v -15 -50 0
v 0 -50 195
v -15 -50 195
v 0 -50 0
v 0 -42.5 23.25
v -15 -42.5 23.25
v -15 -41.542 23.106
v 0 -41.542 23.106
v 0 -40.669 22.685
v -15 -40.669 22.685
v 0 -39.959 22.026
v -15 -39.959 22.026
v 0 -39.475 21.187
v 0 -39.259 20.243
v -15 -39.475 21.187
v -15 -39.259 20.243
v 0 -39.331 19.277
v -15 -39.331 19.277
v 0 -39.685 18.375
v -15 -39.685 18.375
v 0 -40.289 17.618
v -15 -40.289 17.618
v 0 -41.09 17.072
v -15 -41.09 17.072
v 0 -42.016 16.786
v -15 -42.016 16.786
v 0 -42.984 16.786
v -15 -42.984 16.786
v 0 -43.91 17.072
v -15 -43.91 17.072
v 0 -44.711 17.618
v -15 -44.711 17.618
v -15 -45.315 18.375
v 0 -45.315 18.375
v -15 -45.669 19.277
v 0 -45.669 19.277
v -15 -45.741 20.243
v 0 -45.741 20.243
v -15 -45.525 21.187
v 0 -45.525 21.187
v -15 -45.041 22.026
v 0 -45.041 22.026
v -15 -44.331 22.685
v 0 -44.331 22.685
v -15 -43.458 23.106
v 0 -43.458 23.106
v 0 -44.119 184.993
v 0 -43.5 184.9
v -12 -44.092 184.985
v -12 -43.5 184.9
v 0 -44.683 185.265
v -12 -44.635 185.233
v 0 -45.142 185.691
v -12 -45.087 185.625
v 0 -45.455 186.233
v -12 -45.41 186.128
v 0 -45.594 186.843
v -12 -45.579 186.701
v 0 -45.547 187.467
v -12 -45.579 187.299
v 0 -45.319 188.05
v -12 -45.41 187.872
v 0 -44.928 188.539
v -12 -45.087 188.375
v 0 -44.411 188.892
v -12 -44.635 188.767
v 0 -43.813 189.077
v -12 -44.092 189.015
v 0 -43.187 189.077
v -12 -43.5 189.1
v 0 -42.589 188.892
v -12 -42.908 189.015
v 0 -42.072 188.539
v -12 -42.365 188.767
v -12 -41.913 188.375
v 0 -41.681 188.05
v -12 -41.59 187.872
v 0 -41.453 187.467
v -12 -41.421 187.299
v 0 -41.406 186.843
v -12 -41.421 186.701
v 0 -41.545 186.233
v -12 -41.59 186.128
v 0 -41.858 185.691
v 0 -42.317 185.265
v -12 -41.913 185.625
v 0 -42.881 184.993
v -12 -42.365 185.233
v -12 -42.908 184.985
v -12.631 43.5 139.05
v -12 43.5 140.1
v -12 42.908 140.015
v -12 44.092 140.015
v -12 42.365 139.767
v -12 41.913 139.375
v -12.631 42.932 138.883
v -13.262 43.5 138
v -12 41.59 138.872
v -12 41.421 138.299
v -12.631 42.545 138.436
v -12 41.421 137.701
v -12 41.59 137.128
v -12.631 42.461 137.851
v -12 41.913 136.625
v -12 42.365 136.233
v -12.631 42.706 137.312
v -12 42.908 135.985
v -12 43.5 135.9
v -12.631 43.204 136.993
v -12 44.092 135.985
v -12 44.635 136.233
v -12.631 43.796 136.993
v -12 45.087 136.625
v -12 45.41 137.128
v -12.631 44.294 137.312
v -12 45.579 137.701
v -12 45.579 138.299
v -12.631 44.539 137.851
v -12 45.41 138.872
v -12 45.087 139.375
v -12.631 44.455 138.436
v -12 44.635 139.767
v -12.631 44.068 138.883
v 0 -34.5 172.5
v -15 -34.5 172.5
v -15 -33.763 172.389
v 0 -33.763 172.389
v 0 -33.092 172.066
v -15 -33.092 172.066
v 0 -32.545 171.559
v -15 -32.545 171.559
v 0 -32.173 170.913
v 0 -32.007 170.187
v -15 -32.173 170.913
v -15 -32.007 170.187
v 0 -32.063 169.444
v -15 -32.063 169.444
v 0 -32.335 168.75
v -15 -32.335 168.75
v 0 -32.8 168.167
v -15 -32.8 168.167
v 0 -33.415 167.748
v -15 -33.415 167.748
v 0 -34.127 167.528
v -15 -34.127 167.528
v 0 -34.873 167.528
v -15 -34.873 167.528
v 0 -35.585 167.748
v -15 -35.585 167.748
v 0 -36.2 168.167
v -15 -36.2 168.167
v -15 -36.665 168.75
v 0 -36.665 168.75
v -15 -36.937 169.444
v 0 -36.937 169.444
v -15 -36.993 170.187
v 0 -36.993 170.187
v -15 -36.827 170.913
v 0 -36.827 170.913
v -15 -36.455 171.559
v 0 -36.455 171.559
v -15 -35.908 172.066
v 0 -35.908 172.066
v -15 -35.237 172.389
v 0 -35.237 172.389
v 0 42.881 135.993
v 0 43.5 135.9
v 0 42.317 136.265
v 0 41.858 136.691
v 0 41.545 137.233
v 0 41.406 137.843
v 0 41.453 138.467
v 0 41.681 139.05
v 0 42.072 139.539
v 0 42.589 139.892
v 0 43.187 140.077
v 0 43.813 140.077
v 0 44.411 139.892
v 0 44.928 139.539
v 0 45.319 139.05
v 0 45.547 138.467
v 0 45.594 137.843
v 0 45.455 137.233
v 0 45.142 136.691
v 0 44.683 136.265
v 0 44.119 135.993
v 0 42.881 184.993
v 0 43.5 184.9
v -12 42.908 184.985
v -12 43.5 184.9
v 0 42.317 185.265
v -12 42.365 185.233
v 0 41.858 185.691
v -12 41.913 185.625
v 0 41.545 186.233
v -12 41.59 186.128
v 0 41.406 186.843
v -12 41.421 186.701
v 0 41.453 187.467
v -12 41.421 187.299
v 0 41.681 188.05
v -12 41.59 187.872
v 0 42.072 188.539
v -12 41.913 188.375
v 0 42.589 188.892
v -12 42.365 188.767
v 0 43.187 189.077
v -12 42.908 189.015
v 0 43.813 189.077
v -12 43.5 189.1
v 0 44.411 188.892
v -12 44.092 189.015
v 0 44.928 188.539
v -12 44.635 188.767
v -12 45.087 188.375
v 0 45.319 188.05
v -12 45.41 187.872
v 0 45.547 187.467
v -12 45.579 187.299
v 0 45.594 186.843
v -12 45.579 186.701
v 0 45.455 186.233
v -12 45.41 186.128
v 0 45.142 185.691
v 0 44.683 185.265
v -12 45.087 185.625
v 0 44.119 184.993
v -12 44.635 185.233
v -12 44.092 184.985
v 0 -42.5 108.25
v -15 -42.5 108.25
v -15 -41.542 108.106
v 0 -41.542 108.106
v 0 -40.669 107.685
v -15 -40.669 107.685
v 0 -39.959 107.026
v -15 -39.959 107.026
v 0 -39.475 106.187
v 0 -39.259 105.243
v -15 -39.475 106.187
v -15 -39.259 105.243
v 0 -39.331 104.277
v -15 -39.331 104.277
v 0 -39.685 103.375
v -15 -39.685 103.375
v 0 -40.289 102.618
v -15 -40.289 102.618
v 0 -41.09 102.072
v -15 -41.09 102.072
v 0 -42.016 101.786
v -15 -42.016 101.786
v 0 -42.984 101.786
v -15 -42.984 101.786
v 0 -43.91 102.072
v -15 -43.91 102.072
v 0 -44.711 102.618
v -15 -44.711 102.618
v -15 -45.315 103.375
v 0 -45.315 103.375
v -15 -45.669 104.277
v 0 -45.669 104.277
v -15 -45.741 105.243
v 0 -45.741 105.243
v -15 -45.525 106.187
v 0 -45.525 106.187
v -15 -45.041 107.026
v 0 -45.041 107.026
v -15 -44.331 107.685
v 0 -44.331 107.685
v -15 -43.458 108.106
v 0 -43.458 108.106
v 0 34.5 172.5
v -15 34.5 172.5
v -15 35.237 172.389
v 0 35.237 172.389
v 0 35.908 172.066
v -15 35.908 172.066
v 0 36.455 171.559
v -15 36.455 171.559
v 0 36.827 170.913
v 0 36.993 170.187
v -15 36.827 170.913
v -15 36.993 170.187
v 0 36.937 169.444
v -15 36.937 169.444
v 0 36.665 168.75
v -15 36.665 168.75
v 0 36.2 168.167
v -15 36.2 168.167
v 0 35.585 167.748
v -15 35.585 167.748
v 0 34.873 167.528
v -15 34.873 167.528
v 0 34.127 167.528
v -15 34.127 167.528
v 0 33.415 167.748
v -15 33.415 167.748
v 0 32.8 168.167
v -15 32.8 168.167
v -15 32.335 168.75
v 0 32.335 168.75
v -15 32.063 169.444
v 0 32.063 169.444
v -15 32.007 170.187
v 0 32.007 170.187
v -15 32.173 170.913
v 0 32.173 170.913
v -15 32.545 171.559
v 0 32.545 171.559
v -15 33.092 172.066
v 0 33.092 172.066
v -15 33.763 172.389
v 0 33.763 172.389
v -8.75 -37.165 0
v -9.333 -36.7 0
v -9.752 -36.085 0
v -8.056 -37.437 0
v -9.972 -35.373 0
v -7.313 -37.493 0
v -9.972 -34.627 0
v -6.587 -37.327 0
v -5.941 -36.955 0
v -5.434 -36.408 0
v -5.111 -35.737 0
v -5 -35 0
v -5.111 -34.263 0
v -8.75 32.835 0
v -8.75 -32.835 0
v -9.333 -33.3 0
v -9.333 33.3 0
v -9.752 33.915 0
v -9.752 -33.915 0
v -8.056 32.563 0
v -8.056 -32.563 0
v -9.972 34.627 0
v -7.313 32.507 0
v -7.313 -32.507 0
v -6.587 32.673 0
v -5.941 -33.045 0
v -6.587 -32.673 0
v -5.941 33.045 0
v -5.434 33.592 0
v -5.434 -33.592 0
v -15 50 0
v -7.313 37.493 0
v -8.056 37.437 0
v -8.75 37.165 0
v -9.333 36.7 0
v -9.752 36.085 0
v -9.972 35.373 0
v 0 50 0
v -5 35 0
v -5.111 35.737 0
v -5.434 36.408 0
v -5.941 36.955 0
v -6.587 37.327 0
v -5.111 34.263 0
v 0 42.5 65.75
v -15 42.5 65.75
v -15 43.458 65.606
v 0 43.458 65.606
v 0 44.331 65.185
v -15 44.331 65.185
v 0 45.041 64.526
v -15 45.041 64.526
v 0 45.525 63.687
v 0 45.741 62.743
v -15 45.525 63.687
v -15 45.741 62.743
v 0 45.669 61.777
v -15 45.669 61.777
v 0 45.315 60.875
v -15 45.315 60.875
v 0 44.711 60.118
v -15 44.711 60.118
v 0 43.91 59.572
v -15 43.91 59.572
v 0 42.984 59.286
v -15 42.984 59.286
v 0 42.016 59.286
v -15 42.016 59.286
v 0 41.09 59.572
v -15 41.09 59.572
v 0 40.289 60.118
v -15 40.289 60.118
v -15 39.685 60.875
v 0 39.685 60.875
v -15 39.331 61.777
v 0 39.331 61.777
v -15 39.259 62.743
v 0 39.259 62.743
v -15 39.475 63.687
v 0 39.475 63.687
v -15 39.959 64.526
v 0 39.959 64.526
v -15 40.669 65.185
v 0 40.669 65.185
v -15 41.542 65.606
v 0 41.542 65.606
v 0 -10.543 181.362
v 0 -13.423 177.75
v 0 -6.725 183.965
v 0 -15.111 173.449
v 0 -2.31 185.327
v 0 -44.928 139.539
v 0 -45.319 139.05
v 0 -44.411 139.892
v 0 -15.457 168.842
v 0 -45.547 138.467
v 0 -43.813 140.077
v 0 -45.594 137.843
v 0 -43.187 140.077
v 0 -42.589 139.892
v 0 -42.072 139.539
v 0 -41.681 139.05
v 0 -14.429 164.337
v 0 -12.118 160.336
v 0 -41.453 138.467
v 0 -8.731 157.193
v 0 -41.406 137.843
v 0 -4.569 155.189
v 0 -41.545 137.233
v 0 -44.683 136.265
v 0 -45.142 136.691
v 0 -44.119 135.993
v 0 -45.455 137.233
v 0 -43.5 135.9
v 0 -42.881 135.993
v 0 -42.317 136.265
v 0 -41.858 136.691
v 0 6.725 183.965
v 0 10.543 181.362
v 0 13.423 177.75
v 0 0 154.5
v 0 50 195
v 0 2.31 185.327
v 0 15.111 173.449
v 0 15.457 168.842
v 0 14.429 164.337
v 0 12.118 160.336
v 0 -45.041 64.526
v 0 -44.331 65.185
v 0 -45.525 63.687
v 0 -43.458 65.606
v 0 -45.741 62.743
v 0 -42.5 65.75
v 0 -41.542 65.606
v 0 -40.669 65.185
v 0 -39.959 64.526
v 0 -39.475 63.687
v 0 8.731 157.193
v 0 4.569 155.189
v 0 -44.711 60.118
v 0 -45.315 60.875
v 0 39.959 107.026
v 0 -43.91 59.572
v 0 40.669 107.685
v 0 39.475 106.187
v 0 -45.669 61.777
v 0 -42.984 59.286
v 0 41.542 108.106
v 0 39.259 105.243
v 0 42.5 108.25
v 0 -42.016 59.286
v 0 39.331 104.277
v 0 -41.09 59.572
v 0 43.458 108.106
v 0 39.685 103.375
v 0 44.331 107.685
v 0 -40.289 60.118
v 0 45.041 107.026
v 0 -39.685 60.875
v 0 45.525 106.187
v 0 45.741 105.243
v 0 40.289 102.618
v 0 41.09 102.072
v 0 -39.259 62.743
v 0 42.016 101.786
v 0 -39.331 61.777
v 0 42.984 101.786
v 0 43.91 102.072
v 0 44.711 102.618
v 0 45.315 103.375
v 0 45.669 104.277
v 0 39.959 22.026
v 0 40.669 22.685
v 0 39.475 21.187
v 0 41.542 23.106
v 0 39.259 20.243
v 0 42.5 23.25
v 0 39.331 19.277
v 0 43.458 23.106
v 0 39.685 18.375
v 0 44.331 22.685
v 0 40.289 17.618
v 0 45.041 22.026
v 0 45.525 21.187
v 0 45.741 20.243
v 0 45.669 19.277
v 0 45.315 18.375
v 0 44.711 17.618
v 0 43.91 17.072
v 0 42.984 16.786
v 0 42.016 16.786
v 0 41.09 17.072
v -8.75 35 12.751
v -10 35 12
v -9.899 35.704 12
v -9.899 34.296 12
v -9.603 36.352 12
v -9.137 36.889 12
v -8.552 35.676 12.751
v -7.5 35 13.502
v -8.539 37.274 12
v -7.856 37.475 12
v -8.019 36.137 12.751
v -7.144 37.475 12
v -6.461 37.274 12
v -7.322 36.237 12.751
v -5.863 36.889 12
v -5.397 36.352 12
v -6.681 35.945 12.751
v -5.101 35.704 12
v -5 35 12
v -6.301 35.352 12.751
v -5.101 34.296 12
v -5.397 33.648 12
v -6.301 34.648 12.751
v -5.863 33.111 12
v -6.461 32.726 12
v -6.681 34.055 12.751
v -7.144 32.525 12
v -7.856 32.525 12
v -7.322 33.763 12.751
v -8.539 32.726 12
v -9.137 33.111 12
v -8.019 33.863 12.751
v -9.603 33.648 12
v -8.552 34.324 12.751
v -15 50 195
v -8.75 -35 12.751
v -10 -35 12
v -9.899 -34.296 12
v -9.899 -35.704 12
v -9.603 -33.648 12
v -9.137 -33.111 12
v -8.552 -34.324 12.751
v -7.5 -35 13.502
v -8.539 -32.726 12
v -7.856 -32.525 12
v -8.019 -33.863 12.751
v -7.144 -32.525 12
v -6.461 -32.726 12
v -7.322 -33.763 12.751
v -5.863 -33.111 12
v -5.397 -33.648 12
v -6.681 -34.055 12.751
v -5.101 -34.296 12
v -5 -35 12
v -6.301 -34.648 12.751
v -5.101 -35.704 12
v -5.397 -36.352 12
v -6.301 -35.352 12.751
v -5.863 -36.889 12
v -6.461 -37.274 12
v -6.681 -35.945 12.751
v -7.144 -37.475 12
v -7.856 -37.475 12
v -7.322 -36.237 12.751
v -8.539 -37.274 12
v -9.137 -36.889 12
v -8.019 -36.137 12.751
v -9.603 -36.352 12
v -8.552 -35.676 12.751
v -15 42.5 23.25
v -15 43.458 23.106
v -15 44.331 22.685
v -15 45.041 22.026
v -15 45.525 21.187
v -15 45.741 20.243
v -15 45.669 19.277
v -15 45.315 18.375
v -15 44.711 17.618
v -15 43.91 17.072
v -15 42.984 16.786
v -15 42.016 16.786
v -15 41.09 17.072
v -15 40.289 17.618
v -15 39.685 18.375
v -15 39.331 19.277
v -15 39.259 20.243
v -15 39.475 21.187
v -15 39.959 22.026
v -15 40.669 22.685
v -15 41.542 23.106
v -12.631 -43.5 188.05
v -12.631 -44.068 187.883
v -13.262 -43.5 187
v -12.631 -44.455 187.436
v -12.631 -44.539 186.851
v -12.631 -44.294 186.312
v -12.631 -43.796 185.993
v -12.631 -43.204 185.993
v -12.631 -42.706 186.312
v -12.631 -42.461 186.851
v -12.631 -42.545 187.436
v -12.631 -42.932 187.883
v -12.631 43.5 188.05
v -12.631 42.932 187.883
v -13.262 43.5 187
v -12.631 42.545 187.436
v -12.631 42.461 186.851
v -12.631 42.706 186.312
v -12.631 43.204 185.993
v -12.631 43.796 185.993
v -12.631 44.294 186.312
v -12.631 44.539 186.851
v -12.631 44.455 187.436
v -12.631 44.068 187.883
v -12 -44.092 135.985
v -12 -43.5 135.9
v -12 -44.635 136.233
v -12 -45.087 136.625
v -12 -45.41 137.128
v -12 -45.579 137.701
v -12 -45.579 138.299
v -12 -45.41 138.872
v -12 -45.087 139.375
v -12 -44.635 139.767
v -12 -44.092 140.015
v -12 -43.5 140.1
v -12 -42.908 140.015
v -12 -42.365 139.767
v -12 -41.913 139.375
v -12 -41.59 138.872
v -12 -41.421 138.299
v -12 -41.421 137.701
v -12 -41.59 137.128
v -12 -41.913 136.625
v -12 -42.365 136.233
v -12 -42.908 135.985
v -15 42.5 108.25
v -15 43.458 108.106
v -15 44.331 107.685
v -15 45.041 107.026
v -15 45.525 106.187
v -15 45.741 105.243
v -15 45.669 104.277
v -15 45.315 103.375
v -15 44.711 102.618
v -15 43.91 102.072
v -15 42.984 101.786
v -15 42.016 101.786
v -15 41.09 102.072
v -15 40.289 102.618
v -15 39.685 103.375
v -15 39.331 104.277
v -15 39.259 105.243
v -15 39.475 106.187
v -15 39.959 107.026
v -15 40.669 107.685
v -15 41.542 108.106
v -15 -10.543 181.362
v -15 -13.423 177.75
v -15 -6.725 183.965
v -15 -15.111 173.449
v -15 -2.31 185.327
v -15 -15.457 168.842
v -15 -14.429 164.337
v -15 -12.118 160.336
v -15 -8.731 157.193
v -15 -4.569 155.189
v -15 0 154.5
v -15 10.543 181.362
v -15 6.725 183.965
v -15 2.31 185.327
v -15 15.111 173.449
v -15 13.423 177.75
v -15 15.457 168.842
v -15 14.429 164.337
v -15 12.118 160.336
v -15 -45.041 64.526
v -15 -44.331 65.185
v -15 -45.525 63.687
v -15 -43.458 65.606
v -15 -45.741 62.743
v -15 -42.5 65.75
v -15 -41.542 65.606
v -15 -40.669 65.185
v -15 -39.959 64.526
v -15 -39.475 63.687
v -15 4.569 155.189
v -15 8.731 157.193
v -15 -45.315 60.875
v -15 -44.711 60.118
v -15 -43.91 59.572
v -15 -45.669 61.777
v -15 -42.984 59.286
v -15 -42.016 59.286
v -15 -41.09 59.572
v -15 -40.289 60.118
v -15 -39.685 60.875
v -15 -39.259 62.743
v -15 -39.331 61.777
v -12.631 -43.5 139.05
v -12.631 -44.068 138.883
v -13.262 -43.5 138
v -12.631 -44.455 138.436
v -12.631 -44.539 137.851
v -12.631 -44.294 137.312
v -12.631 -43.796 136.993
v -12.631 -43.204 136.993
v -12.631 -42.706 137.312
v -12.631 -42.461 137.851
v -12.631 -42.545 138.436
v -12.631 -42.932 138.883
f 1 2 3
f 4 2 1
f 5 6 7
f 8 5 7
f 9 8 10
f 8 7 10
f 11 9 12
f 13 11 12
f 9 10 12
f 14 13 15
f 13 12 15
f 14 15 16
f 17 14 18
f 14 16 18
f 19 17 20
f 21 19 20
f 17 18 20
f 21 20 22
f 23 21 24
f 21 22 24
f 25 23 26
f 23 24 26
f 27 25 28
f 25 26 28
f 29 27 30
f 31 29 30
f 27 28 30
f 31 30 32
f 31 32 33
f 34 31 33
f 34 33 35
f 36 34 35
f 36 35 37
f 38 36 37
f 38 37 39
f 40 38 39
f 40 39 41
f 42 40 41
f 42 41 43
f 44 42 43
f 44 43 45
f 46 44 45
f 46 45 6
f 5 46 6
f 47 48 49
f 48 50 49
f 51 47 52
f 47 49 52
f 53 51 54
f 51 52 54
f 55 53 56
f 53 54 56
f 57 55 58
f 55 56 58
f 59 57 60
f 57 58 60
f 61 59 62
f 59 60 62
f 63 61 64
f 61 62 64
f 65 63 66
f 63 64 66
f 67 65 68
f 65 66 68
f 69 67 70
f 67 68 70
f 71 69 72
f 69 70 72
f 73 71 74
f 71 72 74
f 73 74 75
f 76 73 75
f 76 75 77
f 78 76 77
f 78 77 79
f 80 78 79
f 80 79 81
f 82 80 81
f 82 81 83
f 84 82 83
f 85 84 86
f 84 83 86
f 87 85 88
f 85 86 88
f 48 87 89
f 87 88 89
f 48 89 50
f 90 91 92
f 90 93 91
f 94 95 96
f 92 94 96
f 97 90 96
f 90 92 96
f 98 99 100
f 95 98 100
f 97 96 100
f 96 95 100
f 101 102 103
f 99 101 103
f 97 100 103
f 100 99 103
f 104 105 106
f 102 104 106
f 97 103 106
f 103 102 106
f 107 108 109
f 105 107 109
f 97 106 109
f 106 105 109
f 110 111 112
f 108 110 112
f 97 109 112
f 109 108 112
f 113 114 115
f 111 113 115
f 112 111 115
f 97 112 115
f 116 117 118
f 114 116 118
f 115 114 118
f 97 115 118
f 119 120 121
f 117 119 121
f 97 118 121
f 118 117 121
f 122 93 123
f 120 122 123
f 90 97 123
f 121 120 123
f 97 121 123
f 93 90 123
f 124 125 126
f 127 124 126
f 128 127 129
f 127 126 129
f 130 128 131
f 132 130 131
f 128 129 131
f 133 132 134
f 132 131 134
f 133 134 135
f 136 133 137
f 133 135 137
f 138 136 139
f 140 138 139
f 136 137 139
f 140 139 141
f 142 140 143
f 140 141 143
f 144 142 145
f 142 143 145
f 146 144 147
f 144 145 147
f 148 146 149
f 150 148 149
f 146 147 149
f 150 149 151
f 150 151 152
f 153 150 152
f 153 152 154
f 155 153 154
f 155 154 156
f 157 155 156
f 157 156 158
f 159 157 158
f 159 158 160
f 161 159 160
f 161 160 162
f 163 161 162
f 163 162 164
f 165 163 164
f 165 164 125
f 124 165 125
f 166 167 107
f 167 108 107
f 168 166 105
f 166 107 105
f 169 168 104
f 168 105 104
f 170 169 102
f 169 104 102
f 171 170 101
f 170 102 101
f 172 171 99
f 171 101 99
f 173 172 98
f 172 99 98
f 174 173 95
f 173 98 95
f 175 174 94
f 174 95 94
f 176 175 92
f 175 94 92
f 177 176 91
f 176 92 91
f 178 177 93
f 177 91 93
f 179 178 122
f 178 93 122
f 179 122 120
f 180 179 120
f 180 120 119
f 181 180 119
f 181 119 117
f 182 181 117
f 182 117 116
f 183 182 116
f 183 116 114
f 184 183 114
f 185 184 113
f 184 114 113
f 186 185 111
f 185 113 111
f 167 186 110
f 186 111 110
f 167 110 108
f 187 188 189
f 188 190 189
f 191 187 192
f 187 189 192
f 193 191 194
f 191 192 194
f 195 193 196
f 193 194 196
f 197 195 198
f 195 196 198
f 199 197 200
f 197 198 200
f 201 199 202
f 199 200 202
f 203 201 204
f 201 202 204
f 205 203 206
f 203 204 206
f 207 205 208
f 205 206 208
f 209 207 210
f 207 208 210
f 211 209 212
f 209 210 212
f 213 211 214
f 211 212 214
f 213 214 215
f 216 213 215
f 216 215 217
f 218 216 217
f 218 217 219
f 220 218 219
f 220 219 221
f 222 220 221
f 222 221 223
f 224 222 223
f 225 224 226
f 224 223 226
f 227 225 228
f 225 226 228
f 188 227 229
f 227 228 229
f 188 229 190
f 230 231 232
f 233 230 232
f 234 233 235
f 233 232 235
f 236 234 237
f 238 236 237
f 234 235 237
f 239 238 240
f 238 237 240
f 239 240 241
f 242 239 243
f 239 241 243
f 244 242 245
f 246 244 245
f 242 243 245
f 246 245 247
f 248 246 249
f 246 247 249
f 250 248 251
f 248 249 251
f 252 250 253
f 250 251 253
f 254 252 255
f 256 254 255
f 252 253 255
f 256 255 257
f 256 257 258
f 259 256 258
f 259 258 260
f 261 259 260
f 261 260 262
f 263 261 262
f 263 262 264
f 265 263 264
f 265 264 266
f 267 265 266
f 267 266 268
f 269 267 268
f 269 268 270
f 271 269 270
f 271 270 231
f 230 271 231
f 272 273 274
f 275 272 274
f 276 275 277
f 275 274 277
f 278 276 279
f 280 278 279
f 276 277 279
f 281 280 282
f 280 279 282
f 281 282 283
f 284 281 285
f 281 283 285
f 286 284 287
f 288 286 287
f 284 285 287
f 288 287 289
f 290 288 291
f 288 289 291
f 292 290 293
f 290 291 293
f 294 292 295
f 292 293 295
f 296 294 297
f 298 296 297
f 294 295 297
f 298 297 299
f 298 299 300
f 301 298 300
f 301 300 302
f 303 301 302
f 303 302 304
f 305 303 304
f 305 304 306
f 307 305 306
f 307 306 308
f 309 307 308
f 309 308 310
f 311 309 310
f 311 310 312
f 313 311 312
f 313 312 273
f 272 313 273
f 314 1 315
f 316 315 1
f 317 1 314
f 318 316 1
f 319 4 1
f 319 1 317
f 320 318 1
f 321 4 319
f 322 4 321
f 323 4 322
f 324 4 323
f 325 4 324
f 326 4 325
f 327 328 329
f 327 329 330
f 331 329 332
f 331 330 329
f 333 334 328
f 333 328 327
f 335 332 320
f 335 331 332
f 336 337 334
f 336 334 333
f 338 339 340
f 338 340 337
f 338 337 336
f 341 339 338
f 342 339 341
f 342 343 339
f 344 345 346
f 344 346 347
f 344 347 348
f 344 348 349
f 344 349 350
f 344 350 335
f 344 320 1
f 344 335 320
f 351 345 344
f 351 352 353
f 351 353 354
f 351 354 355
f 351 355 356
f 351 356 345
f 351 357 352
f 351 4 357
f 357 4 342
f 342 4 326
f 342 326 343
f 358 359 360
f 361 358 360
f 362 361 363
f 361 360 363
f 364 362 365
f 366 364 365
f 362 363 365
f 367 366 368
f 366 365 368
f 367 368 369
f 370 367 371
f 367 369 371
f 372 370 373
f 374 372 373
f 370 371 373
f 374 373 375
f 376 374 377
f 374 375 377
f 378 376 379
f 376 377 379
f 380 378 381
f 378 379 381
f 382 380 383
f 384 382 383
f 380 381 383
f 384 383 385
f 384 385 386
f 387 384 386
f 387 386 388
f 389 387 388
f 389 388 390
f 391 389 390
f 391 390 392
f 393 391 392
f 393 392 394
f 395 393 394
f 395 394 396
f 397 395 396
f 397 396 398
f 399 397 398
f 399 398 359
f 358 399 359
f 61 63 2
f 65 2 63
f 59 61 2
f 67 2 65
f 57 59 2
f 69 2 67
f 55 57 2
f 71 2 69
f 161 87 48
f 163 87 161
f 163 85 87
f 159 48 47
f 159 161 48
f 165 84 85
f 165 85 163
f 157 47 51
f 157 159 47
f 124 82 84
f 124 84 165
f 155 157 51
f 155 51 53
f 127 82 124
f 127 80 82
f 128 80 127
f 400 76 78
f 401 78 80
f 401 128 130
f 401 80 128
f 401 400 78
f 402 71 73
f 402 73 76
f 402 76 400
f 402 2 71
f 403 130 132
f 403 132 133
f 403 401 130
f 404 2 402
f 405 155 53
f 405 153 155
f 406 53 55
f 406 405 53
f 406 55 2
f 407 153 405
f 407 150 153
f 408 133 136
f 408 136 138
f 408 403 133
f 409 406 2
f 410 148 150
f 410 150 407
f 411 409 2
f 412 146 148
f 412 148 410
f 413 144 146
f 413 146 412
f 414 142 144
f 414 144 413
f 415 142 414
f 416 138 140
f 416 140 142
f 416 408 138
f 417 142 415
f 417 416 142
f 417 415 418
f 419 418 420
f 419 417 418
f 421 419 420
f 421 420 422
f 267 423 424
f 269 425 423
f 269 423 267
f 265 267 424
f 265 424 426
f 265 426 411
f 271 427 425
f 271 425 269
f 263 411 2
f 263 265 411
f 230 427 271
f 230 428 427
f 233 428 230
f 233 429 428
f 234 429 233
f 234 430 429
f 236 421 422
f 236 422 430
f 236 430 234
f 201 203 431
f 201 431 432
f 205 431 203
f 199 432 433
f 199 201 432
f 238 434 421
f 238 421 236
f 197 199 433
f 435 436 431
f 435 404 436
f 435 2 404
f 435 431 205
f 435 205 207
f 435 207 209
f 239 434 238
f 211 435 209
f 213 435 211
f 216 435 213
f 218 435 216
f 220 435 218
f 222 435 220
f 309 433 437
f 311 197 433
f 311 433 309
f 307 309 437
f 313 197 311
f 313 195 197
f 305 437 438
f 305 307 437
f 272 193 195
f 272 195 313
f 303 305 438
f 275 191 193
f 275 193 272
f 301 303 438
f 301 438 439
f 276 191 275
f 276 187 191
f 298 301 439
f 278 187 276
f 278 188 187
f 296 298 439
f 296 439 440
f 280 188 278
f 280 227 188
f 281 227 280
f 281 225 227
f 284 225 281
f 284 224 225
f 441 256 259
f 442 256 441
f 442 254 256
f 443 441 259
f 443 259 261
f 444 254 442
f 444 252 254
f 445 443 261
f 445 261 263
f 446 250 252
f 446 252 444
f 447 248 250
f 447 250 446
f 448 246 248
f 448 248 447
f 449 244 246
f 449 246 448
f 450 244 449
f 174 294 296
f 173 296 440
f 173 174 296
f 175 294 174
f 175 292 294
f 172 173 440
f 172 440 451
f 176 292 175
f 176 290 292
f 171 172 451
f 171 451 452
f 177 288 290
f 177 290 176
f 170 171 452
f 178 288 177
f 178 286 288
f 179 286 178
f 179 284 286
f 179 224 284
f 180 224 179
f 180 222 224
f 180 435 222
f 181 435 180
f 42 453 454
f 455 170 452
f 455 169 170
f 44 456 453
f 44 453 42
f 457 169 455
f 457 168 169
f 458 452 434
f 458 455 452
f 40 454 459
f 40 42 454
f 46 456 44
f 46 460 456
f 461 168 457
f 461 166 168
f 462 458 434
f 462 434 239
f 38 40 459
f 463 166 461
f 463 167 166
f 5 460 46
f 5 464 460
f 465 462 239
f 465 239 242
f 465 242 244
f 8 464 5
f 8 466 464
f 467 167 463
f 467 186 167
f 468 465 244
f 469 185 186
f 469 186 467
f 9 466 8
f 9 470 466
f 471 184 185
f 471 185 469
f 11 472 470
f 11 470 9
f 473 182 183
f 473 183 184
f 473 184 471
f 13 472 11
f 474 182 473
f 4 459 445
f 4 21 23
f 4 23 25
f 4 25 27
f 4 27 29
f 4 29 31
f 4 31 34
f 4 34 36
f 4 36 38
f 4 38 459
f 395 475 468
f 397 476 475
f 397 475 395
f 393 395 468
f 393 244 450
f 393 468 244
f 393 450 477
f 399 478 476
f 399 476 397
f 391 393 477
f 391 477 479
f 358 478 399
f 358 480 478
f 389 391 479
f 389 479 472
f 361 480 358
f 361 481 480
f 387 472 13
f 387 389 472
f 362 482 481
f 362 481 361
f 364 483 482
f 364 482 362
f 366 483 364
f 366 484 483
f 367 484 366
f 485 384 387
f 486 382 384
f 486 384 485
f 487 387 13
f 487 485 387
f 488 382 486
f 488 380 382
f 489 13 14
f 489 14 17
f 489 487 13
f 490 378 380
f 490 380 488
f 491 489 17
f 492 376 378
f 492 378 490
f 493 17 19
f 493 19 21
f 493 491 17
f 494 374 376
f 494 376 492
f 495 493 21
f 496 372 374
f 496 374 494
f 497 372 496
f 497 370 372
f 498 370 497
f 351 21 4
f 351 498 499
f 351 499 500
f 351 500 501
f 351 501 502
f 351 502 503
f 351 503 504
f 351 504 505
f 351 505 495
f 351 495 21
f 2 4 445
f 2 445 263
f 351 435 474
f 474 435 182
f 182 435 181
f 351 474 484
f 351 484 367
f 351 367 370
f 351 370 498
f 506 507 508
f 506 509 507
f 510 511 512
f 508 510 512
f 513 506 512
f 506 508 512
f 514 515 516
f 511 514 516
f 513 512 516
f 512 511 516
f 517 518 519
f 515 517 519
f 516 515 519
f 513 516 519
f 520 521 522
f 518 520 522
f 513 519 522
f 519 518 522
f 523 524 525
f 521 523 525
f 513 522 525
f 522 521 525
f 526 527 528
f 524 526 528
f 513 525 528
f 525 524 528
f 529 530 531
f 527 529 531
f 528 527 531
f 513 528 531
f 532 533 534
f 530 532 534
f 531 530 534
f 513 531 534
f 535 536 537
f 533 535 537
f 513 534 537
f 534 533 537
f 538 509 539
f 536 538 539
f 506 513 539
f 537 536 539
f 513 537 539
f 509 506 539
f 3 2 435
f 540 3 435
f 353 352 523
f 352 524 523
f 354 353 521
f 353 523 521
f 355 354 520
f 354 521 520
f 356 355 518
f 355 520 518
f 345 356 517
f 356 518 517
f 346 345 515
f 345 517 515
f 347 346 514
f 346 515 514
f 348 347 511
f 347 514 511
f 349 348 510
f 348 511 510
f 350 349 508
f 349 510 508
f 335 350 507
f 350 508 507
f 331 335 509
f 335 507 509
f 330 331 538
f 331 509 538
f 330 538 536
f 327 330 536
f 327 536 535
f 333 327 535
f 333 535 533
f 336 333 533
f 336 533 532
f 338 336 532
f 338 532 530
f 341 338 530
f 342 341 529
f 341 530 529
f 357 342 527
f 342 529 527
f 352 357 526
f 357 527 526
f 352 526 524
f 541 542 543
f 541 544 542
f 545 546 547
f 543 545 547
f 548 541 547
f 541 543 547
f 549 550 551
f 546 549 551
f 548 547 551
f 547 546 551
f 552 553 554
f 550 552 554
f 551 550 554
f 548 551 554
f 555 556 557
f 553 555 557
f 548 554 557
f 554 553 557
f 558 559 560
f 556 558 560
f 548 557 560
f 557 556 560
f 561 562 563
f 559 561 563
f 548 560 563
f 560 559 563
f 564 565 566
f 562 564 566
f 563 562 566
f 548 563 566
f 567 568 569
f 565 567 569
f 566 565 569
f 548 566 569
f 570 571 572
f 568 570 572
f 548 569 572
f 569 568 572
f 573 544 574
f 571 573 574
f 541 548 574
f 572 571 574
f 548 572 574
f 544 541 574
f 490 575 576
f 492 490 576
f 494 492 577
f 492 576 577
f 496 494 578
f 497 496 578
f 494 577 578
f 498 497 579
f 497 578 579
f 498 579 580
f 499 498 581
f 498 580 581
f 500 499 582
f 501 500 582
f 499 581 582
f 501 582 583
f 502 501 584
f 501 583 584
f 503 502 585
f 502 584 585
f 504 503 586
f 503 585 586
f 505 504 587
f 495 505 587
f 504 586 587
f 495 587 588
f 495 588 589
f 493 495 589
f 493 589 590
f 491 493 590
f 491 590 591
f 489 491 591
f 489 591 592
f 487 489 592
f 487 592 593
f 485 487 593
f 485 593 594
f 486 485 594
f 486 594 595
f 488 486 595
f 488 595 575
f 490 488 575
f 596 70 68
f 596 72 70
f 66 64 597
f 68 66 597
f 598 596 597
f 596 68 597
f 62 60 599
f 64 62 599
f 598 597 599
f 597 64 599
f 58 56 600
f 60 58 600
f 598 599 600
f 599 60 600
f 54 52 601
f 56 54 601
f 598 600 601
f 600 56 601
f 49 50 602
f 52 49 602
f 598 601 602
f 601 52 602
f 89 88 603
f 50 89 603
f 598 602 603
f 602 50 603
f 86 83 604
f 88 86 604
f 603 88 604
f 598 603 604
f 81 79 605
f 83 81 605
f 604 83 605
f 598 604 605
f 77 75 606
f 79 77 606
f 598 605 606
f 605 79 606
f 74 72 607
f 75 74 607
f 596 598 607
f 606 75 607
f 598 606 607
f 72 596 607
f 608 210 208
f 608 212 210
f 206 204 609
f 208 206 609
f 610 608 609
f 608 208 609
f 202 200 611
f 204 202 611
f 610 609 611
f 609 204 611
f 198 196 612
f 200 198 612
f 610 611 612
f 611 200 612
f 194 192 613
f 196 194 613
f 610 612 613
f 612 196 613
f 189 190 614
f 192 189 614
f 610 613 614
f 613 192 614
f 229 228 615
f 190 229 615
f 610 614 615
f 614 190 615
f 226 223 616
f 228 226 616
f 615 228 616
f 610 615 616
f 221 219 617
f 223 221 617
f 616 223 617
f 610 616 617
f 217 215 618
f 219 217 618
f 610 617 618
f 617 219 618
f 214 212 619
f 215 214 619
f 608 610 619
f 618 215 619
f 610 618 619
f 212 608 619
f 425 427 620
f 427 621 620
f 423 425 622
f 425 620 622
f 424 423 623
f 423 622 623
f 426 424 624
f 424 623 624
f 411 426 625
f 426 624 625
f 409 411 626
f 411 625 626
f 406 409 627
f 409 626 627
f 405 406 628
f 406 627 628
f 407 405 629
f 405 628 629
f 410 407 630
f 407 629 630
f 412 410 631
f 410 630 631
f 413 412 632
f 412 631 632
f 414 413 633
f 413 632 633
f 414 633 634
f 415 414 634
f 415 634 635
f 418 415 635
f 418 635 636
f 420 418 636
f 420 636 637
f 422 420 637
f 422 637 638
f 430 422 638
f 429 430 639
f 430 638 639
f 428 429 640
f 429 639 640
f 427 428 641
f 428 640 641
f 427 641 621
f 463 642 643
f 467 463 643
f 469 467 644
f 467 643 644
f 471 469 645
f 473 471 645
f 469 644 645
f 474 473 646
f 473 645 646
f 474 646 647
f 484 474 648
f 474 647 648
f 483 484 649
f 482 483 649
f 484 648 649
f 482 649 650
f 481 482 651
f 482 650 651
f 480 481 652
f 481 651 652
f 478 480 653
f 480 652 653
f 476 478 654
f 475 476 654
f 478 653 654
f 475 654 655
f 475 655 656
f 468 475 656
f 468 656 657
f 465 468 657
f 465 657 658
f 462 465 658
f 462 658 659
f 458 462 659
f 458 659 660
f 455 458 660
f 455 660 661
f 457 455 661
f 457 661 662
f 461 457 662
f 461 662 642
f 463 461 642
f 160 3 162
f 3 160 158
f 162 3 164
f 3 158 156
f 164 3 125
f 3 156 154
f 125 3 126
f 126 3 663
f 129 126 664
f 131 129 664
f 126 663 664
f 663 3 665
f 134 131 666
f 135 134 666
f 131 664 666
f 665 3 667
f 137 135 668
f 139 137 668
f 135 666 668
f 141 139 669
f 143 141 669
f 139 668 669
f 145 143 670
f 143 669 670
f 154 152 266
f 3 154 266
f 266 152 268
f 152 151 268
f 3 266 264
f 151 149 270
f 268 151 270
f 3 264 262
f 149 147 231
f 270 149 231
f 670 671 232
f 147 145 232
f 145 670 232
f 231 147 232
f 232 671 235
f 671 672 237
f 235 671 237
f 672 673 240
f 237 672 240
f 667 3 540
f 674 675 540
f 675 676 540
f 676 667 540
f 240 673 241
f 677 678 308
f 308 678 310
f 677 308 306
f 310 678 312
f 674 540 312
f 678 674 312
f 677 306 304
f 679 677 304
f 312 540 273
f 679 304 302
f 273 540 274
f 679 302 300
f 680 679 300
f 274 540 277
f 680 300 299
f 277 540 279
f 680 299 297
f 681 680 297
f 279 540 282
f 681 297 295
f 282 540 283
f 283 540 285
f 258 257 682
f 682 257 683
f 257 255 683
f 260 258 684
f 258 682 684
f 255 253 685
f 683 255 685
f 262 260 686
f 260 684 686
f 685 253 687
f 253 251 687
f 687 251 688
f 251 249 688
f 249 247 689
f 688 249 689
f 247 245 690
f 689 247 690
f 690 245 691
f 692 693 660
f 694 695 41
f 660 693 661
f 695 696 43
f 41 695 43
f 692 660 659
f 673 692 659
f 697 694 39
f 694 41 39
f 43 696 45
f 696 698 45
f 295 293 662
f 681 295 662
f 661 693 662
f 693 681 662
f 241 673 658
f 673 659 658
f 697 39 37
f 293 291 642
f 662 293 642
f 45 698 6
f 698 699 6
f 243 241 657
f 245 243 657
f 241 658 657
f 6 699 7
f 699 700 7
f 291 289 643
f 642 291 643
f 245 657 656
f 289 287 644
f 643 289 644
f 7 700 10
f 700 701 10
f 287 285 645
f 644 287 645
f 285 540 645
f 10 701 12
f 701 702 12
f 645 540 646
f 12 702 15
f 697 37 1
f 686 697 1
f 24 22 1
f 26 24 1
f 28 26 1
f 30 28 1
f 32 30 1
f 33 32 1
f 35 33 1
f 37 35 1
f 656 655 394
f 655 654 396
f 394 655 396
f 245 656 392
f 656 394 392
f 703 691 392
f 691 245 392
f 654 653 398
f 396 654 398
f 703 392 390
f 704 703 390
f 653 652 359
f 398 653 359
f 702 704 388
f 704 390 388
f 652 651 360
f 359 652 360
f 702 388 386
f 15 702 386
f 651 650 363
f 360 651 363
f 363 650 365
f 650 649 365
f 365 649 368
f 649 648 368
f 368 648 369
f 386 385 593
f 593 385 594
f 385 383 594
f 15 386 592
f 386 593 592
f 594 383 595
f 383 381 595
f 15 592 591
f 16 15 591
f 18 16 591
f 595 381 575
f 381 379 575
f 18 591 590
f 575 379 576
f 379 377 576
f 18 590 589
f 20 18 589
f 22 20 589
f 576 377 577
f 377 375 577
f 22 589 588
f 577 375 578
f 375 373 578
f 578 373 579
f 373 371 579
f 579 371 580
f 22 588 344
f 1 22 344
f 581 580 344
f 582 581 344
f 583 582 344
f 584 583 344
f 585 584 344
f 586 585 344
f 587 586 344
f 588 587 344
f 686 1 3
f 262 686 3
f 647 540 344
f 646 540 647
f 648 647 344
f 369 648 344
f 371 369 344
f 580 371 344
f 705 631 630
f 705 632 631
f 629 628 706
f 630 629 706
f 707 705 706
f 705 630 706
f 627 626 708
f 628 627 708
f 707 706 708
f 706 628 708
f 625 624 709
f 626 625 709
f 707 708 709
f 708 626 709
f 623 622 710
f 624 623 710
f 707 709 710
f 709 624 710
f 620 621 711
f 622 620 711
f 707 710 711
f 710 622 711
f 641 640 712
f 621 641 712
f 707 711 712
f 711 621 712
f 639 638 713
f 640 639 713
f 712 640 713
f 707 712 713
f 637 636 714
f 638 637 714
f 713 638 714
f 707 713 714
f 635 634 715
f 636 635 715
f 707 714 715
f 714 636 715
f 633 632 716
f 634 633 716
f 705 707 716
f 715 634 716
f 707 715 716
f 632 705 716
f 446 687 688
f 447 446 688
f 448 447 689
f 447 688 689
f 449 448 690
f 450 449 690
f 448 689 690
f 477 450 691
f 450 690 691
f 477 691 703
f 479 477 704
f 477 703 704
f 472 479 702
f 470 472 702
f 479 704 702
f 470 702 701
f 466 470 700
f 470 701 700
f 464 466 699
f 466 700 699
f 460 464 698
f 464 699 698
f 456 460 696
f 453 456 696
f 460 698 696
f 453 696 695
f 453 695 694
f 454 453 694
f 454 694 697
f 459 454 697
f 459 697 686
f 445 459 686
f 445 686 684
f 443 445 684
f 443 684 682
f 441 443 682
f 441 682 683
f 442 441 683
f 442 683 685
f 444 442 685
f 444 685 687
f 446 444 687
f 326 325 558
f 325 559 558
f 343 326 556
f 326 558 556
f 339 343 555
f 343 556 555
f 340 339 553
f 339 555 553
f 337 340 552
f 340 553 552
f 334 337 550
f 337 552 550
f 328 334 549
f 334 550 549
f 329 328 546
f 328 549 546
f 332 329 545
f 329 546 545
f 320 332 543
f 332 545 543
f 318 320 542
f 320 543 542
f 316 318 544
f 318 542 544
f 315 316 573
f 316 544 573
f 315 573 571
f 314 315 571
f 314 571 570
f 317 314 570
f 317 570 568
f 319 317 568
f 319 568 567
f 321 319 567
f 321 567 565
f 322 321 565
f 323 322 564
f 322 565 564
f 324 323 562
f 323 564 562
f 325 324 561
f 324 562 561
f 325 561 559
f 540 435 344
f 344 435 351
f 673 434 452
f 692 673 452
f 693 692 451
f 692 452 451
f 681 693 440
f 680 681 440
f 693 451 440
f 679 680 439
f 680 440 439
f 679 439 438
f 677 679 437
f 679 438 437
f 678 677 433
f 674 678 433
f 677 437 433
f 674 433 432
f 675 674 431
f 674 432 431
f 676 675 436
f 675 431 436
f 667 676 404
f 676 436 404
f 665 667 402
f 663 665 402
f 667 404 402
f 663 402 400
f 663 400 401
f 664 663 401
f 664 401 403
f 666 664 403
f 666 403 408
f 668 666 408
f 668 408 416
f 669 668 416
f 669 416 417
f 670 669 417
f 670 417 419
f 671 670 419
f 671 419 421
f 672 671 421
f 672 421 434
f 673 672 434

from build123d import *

# Parameters (mm, degrees)
SKETCH11_W                 = 195
SKETCH11_H                 = 100
BOSS_EXTRUDE2_DEPTH        = 15
SKETCH2_R                  = 15.5
CUT_EXTRUDE1_DEPTH         = 202.866292382
M6_TAPPED_HOLE1_D          = 5
M6_TAPPED_HOLE1_DEPTH      = 12
M6_TAPPED_HOLE1_TIP        = 1.502151548
F_6_5_6_5_DIAMETER_HOLE1_D = 6.5
M5_TAPPED_HOLE1_D          = 4.2
M5_TAPPED_HOLE1_DEPTH      = 12
M5_TAPPED_HOLE1_TIP        = 1.2618073
M6_TAPPED_HOLE2_D          = 5


with BuildPart() as part:
    # Sketch11 → Boss-Extrude2 (new body)
    with BuildSketch(Plane(origin=(0, 0, 0), x_dir=(0, 0, -1), z_dir=(1, 0, 0))):
        with Locations((-97.5, 0)):
            Rectangle(SKETCH11_W, SKETCH11_H)
    extrude(amount=-BOSS_EXTRUDE2_DEPTH)

    # Sketch2 → Cut-Extrude1 (cut, through all)
    with BuildSketch(Plane(origin=(0, 0, 0), x_dir=(0, 0, -1), z_dir=(1, 0, 0))):
        with Locations((-170, 0)):
            Circle(SKETCH2_R)
    extrude(amount=-CUT_EXTRUDE1_DEPTH, mode=Mode.SUBTRACT)

    # M6 Tapped Hole1
    with Locations(Plane(origin=(-11.981616001, -34.658638116, 0), x_dir=(-1, 0, 0), z_dir=(0, 0, -1))):
        with Locations((-4.481616001, -0.341361884), (-4.481616001, 69.658638116)):
            Hole(M6_TAPPED_HOLE1_D / 2, depth=M6_TAPPED_HOLE1_DEPTH)
            with Locations((0, 0, -(M6_TAPPED_HOLE1_DEPTH + M6_TAPPED_HOLE1_TIP / 2))):  # 118° drill point
                Cone(0, M6_TAPPED_HOLE1_D / 2, M6_TAPPED_HOLE1_TIP, mode=Mode.SUBTRACT)

    # Ø6.5 (6.5) Diameter Hole1 (through all)
    with Locations(Plane(origin=(0, -7.362824857, 24.874407607), x_dir=(0, 0, -1), z_dir=(1, 0, 0))):
        with Locations((-80.125592393, -35.137175143), (-37.625592393, -35.137175143), (4.874407607, -35.137175143), (-80.125592393, 49.862824857), (-37.625592393, 49.862824857), (4.874407607, 49.862824857)):
            Hole(F_6_5_6_5_DIAMETER_HOLE1_D / 2)

    # M5 Tapped Hole1
    with Locations(Plane(origin=(0, -36.291159976, 74.046897255), x_dir=(0, 0, 1), z_dir=(1, 0, 0))):
        with Locations((63.953102745, 7.208840024), (112.953102745, 7.208840024), (112.953102745, -79.791159976), (63.953102745, -79.791159976)):
            Hole(M5_TAPPED_HOLE1_D / 2, depth=M5_TAPPED_HOLE1_DEPTH)
            with Locations((0, 0, -(M5_TAPPED_HOLE1_DEPTH + M5_TAPPED_HOLE1_TIP / 2))):  # 118° drill point
                Cone(0, M5_TAPPED_HOLE1_D / 2, M5_TAPPED_HOLE1_TIP, mode=Mode.SUBTRACT)

    # M6 Tapped Hole2 (through all)
    with Locations(Plane(origin=(0, -42.104801514, 47.963156397), x_dir=(0, 0, -1), z_dir=(1, 0, 0))):
        with Locations((-122.036843603, 7.604801514), (-122.036843603, 76.604801514)):
            Hole(M6_TAPPED_HOLE2_D / 2)


solid = part.part
